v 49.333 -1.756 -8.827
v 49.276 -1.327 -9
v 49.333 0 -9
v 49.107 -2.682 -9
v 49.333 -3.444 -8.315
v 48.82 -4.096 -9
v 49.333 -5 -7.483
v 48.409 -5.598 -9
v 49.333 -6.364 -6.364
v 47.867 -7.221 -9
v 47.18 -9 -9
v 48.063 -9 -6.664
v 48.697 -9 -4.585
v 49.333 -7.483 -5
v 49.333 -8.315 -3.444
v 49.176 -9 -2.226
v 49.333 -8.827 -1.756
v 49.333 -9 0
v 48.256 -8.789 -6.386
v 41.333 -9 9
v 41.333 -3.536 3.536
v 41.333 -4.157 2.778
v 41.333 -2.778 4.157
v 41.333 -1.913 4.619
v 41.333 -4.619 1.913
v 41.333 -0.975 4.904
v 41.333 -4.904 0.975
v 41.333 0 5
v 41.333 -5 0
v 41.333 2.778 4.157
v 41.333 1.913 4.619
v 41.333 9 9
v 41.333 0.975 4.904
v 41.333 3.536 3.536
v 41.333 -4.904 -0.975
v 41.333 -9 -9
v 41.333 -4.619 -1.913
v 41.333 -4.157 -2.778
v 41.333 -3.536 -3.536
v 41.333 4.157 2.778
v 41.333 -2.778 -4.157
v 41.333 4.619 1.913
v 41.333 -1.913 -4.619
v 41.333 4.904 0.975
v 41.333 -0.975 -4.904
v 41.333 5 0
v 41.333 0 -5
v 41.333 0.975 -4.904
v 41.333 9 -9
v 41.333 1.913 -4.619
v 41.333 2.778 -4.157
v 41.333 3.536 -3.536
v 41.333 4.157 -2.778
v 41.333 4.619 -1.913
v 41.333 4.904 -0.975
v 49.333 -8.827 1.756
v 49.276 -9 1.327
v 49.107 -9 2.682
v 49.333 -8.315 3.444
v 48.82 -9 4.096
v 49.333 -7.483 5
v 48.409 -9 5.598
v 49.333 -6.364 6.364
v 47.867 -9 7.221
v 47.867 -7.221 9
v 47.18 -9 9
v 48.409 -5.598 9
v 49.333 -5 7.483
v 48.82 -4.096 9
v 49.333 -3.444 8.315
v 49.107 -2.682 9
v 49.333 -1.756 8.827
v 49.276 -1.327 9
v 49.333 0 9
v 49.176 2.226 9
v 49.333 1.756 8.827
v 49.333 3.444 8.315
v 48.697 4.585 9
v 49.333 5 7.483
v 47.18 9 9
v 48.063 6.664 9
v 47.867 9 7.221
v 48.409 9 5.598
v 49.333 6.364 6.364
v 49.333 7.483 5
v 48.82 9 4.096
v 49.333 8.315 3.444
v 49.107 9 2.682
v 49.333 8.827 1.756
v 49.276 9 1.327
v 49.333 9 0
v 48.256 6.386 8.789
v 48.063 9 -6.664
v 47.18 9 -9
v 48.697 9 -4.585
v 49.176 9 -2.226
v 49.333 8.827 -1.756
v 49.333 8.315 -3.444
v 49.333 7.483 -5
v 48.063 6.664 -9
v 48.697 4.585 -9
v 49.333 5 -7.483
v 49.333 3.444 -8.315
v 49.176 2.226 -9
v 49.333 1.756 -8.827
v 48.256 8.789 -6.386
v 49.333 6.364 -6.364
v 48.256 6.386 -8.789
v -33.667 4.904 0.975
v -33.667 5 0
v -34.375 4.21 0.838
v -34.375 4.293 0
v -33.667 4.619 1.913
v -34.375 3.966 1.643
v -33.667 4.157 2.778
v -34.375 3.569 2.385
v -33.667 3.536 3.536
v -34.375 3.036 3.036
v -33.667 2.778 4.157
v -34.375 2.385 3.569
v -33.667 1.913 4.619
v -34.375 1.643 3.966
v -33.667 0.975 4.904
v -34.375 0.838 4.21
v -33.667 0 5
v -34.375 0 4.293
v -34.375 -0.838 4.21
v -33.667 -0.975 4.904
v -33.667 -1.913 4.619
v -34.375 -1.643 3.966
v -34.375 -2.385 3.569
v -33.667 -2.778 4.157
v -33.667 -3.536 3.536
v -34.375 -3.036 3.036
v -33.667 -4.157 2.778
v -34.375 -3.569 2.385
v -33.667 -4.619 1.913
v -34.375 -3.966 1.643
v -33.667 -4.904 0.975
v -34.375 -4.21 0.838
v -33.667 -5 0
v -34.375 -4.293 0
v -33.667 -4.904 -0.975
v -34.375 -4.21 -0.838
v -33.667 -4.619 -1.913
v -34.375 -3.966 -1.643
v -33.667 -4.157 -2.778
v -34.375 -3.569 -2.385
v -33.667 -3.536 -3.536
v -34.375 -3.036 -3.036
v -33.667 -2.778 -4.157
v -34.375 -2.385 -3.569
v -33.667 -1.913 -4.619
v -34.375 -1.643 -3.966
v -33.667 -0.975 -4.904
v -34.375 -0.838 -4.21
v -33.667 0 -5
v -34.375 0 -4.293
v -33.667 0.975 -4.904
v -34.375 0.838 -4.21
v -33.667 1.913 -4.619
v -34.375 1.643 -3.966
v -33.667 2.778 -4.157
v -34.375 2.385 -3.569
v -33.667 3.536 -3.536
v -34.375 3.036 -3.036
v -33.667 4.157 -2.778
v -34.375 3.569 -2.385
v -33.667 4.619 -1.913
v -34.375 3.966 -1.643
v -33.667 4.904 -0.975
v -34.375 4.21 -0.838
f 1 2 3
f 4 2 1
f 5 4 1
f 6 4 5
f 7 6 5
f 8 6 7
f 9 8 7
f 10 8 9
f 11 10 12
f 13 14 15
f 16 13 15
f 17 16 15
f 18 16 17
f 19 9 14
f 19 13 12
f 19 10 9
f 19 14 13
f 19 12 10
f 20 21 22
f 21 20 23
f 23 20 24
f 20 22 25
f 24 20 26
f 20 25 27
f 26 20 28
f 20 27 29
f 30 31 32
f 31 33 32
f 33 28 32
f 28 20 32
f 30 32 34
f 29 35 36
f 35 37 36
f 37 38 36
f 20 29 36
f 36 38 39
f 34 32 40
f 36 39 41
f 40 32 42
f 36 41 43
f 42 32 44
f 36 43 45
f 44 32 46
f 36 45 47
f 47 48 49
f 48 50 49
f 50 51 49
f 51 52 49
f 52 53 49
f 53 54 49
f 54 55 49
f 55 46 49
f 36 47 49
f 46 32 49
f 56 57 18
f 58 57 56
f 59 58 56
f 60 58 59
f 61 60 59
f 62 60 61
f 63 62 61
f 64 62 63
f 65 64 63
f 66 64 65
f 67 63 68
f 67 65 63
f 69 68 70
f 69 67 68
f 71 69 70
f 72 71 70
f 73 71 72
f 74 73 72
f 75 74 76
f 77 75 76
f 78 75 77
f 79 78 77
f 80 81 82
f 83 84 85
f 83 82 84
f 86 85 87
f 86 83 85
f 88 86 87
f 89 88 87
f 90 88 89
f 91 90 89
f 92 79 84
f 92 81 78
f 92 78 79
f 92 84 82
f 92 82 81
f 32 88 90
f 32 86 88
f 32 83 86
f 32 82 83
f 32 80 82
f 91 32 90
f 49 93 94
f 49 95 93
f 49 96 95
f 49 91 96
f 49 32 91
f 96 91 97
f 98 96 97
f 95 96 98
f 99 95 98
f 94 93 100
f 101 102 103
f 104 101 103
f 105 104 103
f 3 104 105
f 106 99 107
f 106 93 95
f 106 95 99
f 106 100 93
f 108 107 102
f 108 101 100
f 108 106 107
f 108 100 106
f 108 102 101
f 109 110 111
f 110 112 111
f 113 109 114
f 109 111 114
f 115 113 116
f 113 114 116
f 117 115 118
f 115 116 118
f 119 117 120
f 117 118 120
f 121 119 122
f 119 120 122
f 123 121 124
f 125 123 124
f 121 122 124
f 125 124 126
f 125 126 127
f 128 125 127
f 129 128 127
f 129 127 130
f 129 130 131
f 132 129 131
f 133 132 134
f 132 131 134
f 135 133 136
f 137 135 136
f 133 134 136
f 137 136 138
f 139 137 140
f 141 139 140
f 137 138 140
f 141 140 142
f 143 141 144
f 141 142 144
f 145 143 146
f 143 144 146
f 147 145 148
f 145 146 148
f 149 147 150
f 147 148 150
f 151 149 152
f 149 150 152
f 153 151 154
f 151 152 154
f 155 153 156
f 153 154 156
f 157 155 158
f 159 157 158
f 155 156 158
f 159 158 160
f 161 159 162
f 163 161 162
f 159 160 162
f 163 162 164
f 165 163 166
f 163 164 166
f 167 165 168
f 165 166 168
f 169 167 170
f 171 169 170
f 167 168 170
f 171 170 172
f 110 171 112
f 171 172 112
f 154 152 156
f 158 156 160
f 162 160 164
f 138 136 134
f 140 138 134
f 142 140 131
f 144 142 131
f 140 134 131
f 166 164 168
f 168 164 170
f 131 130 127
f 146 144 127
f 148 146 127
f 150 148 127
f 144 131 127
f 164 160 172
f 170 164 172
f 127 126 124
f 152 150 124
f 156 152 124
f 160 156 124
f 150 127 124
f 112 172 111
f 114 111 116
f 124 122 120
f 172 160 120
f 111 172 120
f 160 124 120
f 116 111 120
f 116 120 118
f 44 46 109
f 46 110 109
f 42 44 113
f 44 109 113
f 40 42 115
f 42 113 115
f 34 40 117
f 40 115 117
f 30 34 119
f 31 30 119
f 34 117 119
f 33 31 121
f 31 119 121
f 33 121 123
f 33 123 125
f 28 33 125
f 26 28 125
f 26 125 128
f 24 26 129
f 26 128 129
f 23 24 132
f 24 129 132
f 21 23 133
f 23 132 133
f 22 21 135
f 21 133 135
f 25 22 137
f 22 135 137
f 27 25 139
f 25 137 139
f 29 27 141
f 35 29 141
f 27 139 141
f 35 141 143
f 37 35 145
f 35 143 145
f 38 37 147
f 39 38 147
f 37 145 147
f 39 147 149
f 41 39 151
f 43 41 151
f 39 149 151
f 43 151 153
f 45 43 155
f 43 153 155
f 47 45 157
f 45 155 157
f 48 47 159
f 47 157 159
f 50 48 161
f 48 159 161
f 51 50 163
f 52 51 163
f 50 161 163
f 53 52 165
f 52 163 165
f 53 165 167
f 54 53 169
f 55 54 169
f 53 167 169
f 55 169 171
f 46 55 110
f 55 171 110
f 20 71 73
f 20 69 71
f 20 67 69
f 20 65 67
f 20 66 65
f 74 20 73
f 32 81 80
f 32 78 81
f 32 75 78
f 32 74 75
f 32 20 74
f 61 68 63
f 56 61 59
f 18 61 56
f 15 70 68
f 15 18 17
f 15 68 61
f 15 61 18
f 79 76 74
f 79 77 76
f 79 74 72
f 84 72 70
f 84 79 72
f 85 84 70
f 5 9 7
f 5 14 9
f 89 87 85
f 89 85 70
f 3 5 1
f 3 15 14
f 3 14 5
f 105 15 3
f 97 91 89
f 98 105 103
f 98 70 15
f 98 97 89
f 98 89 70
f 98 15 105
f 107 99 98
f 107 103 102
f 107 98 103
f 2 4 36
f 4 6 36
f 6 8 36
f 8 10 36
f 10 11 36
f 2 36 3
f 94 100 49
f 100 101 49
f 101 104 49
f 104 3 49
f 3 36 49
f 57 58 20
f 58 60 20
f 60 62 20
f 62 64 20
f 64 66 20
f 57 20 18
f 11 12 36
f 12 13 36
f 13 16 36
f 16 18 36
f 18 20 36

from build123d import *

# Parameters (mm, degrees)
SKETCH4_W           = 18
SKETCH4_H           = 18
BOSS_EXTRUDE1_DEPTH = 8
SKETCH5_OUTSIDE_W   = 72.14
SKETCH5_OUTSIDE_H   = 72.14
SKETCH5_OUTSIDE_R   = 9
CUT_EXTRUDE3_DEPTH  = 10
CUT_EXTRUDE3_TAPER  = 60


with BuildPart() as part:
    # Sketch1 → Revolve1 (revolve)
    with BuildSketch(Plane.XY):
        Polygon((-33.667489974, 5), (-34.374596755, 4.292893219), (-34.374596755, 0), (41.332510026, 0), (41.332510026, 5), align=None)
    revolve(axis=Axis((-59.973351377, 0, 0), (1, 0, 0)))

    # Sketch4 → Boss-Extrude1 (add)
    with BuildSketch(Plane(origin=(41.332510026, 0, 0), x_dir=(0, 0, -1), z_dir=(1, 0, 0))):
        Rectangle(SKETCH4_W, SKETCH4_H)
    extrude(amount=BOSS_EXTRUDE1_DEPTH)

    # Sketch5 outside → Cut-Extrude3 (cut)
    with BuildSketch(Plane(origin=(49.332510026, 0, 0), x_dir=(0, 0, -1), z_dir=(1, 0, 0))):
        Rectangle(SKETCH5_OUTSIDE_W, SKETCH5_OUTSIDE_H)
        Circle(SKETCH5_OUTSIDE_R, mode=Mode.SUBTRACT)
    extrude(amount=-CUT_EXTRUDE3_DEPTH, taper=CUT_EXTRUDE3_TAPER, mode=Mode.SUBTRACT)


solid = part.part
